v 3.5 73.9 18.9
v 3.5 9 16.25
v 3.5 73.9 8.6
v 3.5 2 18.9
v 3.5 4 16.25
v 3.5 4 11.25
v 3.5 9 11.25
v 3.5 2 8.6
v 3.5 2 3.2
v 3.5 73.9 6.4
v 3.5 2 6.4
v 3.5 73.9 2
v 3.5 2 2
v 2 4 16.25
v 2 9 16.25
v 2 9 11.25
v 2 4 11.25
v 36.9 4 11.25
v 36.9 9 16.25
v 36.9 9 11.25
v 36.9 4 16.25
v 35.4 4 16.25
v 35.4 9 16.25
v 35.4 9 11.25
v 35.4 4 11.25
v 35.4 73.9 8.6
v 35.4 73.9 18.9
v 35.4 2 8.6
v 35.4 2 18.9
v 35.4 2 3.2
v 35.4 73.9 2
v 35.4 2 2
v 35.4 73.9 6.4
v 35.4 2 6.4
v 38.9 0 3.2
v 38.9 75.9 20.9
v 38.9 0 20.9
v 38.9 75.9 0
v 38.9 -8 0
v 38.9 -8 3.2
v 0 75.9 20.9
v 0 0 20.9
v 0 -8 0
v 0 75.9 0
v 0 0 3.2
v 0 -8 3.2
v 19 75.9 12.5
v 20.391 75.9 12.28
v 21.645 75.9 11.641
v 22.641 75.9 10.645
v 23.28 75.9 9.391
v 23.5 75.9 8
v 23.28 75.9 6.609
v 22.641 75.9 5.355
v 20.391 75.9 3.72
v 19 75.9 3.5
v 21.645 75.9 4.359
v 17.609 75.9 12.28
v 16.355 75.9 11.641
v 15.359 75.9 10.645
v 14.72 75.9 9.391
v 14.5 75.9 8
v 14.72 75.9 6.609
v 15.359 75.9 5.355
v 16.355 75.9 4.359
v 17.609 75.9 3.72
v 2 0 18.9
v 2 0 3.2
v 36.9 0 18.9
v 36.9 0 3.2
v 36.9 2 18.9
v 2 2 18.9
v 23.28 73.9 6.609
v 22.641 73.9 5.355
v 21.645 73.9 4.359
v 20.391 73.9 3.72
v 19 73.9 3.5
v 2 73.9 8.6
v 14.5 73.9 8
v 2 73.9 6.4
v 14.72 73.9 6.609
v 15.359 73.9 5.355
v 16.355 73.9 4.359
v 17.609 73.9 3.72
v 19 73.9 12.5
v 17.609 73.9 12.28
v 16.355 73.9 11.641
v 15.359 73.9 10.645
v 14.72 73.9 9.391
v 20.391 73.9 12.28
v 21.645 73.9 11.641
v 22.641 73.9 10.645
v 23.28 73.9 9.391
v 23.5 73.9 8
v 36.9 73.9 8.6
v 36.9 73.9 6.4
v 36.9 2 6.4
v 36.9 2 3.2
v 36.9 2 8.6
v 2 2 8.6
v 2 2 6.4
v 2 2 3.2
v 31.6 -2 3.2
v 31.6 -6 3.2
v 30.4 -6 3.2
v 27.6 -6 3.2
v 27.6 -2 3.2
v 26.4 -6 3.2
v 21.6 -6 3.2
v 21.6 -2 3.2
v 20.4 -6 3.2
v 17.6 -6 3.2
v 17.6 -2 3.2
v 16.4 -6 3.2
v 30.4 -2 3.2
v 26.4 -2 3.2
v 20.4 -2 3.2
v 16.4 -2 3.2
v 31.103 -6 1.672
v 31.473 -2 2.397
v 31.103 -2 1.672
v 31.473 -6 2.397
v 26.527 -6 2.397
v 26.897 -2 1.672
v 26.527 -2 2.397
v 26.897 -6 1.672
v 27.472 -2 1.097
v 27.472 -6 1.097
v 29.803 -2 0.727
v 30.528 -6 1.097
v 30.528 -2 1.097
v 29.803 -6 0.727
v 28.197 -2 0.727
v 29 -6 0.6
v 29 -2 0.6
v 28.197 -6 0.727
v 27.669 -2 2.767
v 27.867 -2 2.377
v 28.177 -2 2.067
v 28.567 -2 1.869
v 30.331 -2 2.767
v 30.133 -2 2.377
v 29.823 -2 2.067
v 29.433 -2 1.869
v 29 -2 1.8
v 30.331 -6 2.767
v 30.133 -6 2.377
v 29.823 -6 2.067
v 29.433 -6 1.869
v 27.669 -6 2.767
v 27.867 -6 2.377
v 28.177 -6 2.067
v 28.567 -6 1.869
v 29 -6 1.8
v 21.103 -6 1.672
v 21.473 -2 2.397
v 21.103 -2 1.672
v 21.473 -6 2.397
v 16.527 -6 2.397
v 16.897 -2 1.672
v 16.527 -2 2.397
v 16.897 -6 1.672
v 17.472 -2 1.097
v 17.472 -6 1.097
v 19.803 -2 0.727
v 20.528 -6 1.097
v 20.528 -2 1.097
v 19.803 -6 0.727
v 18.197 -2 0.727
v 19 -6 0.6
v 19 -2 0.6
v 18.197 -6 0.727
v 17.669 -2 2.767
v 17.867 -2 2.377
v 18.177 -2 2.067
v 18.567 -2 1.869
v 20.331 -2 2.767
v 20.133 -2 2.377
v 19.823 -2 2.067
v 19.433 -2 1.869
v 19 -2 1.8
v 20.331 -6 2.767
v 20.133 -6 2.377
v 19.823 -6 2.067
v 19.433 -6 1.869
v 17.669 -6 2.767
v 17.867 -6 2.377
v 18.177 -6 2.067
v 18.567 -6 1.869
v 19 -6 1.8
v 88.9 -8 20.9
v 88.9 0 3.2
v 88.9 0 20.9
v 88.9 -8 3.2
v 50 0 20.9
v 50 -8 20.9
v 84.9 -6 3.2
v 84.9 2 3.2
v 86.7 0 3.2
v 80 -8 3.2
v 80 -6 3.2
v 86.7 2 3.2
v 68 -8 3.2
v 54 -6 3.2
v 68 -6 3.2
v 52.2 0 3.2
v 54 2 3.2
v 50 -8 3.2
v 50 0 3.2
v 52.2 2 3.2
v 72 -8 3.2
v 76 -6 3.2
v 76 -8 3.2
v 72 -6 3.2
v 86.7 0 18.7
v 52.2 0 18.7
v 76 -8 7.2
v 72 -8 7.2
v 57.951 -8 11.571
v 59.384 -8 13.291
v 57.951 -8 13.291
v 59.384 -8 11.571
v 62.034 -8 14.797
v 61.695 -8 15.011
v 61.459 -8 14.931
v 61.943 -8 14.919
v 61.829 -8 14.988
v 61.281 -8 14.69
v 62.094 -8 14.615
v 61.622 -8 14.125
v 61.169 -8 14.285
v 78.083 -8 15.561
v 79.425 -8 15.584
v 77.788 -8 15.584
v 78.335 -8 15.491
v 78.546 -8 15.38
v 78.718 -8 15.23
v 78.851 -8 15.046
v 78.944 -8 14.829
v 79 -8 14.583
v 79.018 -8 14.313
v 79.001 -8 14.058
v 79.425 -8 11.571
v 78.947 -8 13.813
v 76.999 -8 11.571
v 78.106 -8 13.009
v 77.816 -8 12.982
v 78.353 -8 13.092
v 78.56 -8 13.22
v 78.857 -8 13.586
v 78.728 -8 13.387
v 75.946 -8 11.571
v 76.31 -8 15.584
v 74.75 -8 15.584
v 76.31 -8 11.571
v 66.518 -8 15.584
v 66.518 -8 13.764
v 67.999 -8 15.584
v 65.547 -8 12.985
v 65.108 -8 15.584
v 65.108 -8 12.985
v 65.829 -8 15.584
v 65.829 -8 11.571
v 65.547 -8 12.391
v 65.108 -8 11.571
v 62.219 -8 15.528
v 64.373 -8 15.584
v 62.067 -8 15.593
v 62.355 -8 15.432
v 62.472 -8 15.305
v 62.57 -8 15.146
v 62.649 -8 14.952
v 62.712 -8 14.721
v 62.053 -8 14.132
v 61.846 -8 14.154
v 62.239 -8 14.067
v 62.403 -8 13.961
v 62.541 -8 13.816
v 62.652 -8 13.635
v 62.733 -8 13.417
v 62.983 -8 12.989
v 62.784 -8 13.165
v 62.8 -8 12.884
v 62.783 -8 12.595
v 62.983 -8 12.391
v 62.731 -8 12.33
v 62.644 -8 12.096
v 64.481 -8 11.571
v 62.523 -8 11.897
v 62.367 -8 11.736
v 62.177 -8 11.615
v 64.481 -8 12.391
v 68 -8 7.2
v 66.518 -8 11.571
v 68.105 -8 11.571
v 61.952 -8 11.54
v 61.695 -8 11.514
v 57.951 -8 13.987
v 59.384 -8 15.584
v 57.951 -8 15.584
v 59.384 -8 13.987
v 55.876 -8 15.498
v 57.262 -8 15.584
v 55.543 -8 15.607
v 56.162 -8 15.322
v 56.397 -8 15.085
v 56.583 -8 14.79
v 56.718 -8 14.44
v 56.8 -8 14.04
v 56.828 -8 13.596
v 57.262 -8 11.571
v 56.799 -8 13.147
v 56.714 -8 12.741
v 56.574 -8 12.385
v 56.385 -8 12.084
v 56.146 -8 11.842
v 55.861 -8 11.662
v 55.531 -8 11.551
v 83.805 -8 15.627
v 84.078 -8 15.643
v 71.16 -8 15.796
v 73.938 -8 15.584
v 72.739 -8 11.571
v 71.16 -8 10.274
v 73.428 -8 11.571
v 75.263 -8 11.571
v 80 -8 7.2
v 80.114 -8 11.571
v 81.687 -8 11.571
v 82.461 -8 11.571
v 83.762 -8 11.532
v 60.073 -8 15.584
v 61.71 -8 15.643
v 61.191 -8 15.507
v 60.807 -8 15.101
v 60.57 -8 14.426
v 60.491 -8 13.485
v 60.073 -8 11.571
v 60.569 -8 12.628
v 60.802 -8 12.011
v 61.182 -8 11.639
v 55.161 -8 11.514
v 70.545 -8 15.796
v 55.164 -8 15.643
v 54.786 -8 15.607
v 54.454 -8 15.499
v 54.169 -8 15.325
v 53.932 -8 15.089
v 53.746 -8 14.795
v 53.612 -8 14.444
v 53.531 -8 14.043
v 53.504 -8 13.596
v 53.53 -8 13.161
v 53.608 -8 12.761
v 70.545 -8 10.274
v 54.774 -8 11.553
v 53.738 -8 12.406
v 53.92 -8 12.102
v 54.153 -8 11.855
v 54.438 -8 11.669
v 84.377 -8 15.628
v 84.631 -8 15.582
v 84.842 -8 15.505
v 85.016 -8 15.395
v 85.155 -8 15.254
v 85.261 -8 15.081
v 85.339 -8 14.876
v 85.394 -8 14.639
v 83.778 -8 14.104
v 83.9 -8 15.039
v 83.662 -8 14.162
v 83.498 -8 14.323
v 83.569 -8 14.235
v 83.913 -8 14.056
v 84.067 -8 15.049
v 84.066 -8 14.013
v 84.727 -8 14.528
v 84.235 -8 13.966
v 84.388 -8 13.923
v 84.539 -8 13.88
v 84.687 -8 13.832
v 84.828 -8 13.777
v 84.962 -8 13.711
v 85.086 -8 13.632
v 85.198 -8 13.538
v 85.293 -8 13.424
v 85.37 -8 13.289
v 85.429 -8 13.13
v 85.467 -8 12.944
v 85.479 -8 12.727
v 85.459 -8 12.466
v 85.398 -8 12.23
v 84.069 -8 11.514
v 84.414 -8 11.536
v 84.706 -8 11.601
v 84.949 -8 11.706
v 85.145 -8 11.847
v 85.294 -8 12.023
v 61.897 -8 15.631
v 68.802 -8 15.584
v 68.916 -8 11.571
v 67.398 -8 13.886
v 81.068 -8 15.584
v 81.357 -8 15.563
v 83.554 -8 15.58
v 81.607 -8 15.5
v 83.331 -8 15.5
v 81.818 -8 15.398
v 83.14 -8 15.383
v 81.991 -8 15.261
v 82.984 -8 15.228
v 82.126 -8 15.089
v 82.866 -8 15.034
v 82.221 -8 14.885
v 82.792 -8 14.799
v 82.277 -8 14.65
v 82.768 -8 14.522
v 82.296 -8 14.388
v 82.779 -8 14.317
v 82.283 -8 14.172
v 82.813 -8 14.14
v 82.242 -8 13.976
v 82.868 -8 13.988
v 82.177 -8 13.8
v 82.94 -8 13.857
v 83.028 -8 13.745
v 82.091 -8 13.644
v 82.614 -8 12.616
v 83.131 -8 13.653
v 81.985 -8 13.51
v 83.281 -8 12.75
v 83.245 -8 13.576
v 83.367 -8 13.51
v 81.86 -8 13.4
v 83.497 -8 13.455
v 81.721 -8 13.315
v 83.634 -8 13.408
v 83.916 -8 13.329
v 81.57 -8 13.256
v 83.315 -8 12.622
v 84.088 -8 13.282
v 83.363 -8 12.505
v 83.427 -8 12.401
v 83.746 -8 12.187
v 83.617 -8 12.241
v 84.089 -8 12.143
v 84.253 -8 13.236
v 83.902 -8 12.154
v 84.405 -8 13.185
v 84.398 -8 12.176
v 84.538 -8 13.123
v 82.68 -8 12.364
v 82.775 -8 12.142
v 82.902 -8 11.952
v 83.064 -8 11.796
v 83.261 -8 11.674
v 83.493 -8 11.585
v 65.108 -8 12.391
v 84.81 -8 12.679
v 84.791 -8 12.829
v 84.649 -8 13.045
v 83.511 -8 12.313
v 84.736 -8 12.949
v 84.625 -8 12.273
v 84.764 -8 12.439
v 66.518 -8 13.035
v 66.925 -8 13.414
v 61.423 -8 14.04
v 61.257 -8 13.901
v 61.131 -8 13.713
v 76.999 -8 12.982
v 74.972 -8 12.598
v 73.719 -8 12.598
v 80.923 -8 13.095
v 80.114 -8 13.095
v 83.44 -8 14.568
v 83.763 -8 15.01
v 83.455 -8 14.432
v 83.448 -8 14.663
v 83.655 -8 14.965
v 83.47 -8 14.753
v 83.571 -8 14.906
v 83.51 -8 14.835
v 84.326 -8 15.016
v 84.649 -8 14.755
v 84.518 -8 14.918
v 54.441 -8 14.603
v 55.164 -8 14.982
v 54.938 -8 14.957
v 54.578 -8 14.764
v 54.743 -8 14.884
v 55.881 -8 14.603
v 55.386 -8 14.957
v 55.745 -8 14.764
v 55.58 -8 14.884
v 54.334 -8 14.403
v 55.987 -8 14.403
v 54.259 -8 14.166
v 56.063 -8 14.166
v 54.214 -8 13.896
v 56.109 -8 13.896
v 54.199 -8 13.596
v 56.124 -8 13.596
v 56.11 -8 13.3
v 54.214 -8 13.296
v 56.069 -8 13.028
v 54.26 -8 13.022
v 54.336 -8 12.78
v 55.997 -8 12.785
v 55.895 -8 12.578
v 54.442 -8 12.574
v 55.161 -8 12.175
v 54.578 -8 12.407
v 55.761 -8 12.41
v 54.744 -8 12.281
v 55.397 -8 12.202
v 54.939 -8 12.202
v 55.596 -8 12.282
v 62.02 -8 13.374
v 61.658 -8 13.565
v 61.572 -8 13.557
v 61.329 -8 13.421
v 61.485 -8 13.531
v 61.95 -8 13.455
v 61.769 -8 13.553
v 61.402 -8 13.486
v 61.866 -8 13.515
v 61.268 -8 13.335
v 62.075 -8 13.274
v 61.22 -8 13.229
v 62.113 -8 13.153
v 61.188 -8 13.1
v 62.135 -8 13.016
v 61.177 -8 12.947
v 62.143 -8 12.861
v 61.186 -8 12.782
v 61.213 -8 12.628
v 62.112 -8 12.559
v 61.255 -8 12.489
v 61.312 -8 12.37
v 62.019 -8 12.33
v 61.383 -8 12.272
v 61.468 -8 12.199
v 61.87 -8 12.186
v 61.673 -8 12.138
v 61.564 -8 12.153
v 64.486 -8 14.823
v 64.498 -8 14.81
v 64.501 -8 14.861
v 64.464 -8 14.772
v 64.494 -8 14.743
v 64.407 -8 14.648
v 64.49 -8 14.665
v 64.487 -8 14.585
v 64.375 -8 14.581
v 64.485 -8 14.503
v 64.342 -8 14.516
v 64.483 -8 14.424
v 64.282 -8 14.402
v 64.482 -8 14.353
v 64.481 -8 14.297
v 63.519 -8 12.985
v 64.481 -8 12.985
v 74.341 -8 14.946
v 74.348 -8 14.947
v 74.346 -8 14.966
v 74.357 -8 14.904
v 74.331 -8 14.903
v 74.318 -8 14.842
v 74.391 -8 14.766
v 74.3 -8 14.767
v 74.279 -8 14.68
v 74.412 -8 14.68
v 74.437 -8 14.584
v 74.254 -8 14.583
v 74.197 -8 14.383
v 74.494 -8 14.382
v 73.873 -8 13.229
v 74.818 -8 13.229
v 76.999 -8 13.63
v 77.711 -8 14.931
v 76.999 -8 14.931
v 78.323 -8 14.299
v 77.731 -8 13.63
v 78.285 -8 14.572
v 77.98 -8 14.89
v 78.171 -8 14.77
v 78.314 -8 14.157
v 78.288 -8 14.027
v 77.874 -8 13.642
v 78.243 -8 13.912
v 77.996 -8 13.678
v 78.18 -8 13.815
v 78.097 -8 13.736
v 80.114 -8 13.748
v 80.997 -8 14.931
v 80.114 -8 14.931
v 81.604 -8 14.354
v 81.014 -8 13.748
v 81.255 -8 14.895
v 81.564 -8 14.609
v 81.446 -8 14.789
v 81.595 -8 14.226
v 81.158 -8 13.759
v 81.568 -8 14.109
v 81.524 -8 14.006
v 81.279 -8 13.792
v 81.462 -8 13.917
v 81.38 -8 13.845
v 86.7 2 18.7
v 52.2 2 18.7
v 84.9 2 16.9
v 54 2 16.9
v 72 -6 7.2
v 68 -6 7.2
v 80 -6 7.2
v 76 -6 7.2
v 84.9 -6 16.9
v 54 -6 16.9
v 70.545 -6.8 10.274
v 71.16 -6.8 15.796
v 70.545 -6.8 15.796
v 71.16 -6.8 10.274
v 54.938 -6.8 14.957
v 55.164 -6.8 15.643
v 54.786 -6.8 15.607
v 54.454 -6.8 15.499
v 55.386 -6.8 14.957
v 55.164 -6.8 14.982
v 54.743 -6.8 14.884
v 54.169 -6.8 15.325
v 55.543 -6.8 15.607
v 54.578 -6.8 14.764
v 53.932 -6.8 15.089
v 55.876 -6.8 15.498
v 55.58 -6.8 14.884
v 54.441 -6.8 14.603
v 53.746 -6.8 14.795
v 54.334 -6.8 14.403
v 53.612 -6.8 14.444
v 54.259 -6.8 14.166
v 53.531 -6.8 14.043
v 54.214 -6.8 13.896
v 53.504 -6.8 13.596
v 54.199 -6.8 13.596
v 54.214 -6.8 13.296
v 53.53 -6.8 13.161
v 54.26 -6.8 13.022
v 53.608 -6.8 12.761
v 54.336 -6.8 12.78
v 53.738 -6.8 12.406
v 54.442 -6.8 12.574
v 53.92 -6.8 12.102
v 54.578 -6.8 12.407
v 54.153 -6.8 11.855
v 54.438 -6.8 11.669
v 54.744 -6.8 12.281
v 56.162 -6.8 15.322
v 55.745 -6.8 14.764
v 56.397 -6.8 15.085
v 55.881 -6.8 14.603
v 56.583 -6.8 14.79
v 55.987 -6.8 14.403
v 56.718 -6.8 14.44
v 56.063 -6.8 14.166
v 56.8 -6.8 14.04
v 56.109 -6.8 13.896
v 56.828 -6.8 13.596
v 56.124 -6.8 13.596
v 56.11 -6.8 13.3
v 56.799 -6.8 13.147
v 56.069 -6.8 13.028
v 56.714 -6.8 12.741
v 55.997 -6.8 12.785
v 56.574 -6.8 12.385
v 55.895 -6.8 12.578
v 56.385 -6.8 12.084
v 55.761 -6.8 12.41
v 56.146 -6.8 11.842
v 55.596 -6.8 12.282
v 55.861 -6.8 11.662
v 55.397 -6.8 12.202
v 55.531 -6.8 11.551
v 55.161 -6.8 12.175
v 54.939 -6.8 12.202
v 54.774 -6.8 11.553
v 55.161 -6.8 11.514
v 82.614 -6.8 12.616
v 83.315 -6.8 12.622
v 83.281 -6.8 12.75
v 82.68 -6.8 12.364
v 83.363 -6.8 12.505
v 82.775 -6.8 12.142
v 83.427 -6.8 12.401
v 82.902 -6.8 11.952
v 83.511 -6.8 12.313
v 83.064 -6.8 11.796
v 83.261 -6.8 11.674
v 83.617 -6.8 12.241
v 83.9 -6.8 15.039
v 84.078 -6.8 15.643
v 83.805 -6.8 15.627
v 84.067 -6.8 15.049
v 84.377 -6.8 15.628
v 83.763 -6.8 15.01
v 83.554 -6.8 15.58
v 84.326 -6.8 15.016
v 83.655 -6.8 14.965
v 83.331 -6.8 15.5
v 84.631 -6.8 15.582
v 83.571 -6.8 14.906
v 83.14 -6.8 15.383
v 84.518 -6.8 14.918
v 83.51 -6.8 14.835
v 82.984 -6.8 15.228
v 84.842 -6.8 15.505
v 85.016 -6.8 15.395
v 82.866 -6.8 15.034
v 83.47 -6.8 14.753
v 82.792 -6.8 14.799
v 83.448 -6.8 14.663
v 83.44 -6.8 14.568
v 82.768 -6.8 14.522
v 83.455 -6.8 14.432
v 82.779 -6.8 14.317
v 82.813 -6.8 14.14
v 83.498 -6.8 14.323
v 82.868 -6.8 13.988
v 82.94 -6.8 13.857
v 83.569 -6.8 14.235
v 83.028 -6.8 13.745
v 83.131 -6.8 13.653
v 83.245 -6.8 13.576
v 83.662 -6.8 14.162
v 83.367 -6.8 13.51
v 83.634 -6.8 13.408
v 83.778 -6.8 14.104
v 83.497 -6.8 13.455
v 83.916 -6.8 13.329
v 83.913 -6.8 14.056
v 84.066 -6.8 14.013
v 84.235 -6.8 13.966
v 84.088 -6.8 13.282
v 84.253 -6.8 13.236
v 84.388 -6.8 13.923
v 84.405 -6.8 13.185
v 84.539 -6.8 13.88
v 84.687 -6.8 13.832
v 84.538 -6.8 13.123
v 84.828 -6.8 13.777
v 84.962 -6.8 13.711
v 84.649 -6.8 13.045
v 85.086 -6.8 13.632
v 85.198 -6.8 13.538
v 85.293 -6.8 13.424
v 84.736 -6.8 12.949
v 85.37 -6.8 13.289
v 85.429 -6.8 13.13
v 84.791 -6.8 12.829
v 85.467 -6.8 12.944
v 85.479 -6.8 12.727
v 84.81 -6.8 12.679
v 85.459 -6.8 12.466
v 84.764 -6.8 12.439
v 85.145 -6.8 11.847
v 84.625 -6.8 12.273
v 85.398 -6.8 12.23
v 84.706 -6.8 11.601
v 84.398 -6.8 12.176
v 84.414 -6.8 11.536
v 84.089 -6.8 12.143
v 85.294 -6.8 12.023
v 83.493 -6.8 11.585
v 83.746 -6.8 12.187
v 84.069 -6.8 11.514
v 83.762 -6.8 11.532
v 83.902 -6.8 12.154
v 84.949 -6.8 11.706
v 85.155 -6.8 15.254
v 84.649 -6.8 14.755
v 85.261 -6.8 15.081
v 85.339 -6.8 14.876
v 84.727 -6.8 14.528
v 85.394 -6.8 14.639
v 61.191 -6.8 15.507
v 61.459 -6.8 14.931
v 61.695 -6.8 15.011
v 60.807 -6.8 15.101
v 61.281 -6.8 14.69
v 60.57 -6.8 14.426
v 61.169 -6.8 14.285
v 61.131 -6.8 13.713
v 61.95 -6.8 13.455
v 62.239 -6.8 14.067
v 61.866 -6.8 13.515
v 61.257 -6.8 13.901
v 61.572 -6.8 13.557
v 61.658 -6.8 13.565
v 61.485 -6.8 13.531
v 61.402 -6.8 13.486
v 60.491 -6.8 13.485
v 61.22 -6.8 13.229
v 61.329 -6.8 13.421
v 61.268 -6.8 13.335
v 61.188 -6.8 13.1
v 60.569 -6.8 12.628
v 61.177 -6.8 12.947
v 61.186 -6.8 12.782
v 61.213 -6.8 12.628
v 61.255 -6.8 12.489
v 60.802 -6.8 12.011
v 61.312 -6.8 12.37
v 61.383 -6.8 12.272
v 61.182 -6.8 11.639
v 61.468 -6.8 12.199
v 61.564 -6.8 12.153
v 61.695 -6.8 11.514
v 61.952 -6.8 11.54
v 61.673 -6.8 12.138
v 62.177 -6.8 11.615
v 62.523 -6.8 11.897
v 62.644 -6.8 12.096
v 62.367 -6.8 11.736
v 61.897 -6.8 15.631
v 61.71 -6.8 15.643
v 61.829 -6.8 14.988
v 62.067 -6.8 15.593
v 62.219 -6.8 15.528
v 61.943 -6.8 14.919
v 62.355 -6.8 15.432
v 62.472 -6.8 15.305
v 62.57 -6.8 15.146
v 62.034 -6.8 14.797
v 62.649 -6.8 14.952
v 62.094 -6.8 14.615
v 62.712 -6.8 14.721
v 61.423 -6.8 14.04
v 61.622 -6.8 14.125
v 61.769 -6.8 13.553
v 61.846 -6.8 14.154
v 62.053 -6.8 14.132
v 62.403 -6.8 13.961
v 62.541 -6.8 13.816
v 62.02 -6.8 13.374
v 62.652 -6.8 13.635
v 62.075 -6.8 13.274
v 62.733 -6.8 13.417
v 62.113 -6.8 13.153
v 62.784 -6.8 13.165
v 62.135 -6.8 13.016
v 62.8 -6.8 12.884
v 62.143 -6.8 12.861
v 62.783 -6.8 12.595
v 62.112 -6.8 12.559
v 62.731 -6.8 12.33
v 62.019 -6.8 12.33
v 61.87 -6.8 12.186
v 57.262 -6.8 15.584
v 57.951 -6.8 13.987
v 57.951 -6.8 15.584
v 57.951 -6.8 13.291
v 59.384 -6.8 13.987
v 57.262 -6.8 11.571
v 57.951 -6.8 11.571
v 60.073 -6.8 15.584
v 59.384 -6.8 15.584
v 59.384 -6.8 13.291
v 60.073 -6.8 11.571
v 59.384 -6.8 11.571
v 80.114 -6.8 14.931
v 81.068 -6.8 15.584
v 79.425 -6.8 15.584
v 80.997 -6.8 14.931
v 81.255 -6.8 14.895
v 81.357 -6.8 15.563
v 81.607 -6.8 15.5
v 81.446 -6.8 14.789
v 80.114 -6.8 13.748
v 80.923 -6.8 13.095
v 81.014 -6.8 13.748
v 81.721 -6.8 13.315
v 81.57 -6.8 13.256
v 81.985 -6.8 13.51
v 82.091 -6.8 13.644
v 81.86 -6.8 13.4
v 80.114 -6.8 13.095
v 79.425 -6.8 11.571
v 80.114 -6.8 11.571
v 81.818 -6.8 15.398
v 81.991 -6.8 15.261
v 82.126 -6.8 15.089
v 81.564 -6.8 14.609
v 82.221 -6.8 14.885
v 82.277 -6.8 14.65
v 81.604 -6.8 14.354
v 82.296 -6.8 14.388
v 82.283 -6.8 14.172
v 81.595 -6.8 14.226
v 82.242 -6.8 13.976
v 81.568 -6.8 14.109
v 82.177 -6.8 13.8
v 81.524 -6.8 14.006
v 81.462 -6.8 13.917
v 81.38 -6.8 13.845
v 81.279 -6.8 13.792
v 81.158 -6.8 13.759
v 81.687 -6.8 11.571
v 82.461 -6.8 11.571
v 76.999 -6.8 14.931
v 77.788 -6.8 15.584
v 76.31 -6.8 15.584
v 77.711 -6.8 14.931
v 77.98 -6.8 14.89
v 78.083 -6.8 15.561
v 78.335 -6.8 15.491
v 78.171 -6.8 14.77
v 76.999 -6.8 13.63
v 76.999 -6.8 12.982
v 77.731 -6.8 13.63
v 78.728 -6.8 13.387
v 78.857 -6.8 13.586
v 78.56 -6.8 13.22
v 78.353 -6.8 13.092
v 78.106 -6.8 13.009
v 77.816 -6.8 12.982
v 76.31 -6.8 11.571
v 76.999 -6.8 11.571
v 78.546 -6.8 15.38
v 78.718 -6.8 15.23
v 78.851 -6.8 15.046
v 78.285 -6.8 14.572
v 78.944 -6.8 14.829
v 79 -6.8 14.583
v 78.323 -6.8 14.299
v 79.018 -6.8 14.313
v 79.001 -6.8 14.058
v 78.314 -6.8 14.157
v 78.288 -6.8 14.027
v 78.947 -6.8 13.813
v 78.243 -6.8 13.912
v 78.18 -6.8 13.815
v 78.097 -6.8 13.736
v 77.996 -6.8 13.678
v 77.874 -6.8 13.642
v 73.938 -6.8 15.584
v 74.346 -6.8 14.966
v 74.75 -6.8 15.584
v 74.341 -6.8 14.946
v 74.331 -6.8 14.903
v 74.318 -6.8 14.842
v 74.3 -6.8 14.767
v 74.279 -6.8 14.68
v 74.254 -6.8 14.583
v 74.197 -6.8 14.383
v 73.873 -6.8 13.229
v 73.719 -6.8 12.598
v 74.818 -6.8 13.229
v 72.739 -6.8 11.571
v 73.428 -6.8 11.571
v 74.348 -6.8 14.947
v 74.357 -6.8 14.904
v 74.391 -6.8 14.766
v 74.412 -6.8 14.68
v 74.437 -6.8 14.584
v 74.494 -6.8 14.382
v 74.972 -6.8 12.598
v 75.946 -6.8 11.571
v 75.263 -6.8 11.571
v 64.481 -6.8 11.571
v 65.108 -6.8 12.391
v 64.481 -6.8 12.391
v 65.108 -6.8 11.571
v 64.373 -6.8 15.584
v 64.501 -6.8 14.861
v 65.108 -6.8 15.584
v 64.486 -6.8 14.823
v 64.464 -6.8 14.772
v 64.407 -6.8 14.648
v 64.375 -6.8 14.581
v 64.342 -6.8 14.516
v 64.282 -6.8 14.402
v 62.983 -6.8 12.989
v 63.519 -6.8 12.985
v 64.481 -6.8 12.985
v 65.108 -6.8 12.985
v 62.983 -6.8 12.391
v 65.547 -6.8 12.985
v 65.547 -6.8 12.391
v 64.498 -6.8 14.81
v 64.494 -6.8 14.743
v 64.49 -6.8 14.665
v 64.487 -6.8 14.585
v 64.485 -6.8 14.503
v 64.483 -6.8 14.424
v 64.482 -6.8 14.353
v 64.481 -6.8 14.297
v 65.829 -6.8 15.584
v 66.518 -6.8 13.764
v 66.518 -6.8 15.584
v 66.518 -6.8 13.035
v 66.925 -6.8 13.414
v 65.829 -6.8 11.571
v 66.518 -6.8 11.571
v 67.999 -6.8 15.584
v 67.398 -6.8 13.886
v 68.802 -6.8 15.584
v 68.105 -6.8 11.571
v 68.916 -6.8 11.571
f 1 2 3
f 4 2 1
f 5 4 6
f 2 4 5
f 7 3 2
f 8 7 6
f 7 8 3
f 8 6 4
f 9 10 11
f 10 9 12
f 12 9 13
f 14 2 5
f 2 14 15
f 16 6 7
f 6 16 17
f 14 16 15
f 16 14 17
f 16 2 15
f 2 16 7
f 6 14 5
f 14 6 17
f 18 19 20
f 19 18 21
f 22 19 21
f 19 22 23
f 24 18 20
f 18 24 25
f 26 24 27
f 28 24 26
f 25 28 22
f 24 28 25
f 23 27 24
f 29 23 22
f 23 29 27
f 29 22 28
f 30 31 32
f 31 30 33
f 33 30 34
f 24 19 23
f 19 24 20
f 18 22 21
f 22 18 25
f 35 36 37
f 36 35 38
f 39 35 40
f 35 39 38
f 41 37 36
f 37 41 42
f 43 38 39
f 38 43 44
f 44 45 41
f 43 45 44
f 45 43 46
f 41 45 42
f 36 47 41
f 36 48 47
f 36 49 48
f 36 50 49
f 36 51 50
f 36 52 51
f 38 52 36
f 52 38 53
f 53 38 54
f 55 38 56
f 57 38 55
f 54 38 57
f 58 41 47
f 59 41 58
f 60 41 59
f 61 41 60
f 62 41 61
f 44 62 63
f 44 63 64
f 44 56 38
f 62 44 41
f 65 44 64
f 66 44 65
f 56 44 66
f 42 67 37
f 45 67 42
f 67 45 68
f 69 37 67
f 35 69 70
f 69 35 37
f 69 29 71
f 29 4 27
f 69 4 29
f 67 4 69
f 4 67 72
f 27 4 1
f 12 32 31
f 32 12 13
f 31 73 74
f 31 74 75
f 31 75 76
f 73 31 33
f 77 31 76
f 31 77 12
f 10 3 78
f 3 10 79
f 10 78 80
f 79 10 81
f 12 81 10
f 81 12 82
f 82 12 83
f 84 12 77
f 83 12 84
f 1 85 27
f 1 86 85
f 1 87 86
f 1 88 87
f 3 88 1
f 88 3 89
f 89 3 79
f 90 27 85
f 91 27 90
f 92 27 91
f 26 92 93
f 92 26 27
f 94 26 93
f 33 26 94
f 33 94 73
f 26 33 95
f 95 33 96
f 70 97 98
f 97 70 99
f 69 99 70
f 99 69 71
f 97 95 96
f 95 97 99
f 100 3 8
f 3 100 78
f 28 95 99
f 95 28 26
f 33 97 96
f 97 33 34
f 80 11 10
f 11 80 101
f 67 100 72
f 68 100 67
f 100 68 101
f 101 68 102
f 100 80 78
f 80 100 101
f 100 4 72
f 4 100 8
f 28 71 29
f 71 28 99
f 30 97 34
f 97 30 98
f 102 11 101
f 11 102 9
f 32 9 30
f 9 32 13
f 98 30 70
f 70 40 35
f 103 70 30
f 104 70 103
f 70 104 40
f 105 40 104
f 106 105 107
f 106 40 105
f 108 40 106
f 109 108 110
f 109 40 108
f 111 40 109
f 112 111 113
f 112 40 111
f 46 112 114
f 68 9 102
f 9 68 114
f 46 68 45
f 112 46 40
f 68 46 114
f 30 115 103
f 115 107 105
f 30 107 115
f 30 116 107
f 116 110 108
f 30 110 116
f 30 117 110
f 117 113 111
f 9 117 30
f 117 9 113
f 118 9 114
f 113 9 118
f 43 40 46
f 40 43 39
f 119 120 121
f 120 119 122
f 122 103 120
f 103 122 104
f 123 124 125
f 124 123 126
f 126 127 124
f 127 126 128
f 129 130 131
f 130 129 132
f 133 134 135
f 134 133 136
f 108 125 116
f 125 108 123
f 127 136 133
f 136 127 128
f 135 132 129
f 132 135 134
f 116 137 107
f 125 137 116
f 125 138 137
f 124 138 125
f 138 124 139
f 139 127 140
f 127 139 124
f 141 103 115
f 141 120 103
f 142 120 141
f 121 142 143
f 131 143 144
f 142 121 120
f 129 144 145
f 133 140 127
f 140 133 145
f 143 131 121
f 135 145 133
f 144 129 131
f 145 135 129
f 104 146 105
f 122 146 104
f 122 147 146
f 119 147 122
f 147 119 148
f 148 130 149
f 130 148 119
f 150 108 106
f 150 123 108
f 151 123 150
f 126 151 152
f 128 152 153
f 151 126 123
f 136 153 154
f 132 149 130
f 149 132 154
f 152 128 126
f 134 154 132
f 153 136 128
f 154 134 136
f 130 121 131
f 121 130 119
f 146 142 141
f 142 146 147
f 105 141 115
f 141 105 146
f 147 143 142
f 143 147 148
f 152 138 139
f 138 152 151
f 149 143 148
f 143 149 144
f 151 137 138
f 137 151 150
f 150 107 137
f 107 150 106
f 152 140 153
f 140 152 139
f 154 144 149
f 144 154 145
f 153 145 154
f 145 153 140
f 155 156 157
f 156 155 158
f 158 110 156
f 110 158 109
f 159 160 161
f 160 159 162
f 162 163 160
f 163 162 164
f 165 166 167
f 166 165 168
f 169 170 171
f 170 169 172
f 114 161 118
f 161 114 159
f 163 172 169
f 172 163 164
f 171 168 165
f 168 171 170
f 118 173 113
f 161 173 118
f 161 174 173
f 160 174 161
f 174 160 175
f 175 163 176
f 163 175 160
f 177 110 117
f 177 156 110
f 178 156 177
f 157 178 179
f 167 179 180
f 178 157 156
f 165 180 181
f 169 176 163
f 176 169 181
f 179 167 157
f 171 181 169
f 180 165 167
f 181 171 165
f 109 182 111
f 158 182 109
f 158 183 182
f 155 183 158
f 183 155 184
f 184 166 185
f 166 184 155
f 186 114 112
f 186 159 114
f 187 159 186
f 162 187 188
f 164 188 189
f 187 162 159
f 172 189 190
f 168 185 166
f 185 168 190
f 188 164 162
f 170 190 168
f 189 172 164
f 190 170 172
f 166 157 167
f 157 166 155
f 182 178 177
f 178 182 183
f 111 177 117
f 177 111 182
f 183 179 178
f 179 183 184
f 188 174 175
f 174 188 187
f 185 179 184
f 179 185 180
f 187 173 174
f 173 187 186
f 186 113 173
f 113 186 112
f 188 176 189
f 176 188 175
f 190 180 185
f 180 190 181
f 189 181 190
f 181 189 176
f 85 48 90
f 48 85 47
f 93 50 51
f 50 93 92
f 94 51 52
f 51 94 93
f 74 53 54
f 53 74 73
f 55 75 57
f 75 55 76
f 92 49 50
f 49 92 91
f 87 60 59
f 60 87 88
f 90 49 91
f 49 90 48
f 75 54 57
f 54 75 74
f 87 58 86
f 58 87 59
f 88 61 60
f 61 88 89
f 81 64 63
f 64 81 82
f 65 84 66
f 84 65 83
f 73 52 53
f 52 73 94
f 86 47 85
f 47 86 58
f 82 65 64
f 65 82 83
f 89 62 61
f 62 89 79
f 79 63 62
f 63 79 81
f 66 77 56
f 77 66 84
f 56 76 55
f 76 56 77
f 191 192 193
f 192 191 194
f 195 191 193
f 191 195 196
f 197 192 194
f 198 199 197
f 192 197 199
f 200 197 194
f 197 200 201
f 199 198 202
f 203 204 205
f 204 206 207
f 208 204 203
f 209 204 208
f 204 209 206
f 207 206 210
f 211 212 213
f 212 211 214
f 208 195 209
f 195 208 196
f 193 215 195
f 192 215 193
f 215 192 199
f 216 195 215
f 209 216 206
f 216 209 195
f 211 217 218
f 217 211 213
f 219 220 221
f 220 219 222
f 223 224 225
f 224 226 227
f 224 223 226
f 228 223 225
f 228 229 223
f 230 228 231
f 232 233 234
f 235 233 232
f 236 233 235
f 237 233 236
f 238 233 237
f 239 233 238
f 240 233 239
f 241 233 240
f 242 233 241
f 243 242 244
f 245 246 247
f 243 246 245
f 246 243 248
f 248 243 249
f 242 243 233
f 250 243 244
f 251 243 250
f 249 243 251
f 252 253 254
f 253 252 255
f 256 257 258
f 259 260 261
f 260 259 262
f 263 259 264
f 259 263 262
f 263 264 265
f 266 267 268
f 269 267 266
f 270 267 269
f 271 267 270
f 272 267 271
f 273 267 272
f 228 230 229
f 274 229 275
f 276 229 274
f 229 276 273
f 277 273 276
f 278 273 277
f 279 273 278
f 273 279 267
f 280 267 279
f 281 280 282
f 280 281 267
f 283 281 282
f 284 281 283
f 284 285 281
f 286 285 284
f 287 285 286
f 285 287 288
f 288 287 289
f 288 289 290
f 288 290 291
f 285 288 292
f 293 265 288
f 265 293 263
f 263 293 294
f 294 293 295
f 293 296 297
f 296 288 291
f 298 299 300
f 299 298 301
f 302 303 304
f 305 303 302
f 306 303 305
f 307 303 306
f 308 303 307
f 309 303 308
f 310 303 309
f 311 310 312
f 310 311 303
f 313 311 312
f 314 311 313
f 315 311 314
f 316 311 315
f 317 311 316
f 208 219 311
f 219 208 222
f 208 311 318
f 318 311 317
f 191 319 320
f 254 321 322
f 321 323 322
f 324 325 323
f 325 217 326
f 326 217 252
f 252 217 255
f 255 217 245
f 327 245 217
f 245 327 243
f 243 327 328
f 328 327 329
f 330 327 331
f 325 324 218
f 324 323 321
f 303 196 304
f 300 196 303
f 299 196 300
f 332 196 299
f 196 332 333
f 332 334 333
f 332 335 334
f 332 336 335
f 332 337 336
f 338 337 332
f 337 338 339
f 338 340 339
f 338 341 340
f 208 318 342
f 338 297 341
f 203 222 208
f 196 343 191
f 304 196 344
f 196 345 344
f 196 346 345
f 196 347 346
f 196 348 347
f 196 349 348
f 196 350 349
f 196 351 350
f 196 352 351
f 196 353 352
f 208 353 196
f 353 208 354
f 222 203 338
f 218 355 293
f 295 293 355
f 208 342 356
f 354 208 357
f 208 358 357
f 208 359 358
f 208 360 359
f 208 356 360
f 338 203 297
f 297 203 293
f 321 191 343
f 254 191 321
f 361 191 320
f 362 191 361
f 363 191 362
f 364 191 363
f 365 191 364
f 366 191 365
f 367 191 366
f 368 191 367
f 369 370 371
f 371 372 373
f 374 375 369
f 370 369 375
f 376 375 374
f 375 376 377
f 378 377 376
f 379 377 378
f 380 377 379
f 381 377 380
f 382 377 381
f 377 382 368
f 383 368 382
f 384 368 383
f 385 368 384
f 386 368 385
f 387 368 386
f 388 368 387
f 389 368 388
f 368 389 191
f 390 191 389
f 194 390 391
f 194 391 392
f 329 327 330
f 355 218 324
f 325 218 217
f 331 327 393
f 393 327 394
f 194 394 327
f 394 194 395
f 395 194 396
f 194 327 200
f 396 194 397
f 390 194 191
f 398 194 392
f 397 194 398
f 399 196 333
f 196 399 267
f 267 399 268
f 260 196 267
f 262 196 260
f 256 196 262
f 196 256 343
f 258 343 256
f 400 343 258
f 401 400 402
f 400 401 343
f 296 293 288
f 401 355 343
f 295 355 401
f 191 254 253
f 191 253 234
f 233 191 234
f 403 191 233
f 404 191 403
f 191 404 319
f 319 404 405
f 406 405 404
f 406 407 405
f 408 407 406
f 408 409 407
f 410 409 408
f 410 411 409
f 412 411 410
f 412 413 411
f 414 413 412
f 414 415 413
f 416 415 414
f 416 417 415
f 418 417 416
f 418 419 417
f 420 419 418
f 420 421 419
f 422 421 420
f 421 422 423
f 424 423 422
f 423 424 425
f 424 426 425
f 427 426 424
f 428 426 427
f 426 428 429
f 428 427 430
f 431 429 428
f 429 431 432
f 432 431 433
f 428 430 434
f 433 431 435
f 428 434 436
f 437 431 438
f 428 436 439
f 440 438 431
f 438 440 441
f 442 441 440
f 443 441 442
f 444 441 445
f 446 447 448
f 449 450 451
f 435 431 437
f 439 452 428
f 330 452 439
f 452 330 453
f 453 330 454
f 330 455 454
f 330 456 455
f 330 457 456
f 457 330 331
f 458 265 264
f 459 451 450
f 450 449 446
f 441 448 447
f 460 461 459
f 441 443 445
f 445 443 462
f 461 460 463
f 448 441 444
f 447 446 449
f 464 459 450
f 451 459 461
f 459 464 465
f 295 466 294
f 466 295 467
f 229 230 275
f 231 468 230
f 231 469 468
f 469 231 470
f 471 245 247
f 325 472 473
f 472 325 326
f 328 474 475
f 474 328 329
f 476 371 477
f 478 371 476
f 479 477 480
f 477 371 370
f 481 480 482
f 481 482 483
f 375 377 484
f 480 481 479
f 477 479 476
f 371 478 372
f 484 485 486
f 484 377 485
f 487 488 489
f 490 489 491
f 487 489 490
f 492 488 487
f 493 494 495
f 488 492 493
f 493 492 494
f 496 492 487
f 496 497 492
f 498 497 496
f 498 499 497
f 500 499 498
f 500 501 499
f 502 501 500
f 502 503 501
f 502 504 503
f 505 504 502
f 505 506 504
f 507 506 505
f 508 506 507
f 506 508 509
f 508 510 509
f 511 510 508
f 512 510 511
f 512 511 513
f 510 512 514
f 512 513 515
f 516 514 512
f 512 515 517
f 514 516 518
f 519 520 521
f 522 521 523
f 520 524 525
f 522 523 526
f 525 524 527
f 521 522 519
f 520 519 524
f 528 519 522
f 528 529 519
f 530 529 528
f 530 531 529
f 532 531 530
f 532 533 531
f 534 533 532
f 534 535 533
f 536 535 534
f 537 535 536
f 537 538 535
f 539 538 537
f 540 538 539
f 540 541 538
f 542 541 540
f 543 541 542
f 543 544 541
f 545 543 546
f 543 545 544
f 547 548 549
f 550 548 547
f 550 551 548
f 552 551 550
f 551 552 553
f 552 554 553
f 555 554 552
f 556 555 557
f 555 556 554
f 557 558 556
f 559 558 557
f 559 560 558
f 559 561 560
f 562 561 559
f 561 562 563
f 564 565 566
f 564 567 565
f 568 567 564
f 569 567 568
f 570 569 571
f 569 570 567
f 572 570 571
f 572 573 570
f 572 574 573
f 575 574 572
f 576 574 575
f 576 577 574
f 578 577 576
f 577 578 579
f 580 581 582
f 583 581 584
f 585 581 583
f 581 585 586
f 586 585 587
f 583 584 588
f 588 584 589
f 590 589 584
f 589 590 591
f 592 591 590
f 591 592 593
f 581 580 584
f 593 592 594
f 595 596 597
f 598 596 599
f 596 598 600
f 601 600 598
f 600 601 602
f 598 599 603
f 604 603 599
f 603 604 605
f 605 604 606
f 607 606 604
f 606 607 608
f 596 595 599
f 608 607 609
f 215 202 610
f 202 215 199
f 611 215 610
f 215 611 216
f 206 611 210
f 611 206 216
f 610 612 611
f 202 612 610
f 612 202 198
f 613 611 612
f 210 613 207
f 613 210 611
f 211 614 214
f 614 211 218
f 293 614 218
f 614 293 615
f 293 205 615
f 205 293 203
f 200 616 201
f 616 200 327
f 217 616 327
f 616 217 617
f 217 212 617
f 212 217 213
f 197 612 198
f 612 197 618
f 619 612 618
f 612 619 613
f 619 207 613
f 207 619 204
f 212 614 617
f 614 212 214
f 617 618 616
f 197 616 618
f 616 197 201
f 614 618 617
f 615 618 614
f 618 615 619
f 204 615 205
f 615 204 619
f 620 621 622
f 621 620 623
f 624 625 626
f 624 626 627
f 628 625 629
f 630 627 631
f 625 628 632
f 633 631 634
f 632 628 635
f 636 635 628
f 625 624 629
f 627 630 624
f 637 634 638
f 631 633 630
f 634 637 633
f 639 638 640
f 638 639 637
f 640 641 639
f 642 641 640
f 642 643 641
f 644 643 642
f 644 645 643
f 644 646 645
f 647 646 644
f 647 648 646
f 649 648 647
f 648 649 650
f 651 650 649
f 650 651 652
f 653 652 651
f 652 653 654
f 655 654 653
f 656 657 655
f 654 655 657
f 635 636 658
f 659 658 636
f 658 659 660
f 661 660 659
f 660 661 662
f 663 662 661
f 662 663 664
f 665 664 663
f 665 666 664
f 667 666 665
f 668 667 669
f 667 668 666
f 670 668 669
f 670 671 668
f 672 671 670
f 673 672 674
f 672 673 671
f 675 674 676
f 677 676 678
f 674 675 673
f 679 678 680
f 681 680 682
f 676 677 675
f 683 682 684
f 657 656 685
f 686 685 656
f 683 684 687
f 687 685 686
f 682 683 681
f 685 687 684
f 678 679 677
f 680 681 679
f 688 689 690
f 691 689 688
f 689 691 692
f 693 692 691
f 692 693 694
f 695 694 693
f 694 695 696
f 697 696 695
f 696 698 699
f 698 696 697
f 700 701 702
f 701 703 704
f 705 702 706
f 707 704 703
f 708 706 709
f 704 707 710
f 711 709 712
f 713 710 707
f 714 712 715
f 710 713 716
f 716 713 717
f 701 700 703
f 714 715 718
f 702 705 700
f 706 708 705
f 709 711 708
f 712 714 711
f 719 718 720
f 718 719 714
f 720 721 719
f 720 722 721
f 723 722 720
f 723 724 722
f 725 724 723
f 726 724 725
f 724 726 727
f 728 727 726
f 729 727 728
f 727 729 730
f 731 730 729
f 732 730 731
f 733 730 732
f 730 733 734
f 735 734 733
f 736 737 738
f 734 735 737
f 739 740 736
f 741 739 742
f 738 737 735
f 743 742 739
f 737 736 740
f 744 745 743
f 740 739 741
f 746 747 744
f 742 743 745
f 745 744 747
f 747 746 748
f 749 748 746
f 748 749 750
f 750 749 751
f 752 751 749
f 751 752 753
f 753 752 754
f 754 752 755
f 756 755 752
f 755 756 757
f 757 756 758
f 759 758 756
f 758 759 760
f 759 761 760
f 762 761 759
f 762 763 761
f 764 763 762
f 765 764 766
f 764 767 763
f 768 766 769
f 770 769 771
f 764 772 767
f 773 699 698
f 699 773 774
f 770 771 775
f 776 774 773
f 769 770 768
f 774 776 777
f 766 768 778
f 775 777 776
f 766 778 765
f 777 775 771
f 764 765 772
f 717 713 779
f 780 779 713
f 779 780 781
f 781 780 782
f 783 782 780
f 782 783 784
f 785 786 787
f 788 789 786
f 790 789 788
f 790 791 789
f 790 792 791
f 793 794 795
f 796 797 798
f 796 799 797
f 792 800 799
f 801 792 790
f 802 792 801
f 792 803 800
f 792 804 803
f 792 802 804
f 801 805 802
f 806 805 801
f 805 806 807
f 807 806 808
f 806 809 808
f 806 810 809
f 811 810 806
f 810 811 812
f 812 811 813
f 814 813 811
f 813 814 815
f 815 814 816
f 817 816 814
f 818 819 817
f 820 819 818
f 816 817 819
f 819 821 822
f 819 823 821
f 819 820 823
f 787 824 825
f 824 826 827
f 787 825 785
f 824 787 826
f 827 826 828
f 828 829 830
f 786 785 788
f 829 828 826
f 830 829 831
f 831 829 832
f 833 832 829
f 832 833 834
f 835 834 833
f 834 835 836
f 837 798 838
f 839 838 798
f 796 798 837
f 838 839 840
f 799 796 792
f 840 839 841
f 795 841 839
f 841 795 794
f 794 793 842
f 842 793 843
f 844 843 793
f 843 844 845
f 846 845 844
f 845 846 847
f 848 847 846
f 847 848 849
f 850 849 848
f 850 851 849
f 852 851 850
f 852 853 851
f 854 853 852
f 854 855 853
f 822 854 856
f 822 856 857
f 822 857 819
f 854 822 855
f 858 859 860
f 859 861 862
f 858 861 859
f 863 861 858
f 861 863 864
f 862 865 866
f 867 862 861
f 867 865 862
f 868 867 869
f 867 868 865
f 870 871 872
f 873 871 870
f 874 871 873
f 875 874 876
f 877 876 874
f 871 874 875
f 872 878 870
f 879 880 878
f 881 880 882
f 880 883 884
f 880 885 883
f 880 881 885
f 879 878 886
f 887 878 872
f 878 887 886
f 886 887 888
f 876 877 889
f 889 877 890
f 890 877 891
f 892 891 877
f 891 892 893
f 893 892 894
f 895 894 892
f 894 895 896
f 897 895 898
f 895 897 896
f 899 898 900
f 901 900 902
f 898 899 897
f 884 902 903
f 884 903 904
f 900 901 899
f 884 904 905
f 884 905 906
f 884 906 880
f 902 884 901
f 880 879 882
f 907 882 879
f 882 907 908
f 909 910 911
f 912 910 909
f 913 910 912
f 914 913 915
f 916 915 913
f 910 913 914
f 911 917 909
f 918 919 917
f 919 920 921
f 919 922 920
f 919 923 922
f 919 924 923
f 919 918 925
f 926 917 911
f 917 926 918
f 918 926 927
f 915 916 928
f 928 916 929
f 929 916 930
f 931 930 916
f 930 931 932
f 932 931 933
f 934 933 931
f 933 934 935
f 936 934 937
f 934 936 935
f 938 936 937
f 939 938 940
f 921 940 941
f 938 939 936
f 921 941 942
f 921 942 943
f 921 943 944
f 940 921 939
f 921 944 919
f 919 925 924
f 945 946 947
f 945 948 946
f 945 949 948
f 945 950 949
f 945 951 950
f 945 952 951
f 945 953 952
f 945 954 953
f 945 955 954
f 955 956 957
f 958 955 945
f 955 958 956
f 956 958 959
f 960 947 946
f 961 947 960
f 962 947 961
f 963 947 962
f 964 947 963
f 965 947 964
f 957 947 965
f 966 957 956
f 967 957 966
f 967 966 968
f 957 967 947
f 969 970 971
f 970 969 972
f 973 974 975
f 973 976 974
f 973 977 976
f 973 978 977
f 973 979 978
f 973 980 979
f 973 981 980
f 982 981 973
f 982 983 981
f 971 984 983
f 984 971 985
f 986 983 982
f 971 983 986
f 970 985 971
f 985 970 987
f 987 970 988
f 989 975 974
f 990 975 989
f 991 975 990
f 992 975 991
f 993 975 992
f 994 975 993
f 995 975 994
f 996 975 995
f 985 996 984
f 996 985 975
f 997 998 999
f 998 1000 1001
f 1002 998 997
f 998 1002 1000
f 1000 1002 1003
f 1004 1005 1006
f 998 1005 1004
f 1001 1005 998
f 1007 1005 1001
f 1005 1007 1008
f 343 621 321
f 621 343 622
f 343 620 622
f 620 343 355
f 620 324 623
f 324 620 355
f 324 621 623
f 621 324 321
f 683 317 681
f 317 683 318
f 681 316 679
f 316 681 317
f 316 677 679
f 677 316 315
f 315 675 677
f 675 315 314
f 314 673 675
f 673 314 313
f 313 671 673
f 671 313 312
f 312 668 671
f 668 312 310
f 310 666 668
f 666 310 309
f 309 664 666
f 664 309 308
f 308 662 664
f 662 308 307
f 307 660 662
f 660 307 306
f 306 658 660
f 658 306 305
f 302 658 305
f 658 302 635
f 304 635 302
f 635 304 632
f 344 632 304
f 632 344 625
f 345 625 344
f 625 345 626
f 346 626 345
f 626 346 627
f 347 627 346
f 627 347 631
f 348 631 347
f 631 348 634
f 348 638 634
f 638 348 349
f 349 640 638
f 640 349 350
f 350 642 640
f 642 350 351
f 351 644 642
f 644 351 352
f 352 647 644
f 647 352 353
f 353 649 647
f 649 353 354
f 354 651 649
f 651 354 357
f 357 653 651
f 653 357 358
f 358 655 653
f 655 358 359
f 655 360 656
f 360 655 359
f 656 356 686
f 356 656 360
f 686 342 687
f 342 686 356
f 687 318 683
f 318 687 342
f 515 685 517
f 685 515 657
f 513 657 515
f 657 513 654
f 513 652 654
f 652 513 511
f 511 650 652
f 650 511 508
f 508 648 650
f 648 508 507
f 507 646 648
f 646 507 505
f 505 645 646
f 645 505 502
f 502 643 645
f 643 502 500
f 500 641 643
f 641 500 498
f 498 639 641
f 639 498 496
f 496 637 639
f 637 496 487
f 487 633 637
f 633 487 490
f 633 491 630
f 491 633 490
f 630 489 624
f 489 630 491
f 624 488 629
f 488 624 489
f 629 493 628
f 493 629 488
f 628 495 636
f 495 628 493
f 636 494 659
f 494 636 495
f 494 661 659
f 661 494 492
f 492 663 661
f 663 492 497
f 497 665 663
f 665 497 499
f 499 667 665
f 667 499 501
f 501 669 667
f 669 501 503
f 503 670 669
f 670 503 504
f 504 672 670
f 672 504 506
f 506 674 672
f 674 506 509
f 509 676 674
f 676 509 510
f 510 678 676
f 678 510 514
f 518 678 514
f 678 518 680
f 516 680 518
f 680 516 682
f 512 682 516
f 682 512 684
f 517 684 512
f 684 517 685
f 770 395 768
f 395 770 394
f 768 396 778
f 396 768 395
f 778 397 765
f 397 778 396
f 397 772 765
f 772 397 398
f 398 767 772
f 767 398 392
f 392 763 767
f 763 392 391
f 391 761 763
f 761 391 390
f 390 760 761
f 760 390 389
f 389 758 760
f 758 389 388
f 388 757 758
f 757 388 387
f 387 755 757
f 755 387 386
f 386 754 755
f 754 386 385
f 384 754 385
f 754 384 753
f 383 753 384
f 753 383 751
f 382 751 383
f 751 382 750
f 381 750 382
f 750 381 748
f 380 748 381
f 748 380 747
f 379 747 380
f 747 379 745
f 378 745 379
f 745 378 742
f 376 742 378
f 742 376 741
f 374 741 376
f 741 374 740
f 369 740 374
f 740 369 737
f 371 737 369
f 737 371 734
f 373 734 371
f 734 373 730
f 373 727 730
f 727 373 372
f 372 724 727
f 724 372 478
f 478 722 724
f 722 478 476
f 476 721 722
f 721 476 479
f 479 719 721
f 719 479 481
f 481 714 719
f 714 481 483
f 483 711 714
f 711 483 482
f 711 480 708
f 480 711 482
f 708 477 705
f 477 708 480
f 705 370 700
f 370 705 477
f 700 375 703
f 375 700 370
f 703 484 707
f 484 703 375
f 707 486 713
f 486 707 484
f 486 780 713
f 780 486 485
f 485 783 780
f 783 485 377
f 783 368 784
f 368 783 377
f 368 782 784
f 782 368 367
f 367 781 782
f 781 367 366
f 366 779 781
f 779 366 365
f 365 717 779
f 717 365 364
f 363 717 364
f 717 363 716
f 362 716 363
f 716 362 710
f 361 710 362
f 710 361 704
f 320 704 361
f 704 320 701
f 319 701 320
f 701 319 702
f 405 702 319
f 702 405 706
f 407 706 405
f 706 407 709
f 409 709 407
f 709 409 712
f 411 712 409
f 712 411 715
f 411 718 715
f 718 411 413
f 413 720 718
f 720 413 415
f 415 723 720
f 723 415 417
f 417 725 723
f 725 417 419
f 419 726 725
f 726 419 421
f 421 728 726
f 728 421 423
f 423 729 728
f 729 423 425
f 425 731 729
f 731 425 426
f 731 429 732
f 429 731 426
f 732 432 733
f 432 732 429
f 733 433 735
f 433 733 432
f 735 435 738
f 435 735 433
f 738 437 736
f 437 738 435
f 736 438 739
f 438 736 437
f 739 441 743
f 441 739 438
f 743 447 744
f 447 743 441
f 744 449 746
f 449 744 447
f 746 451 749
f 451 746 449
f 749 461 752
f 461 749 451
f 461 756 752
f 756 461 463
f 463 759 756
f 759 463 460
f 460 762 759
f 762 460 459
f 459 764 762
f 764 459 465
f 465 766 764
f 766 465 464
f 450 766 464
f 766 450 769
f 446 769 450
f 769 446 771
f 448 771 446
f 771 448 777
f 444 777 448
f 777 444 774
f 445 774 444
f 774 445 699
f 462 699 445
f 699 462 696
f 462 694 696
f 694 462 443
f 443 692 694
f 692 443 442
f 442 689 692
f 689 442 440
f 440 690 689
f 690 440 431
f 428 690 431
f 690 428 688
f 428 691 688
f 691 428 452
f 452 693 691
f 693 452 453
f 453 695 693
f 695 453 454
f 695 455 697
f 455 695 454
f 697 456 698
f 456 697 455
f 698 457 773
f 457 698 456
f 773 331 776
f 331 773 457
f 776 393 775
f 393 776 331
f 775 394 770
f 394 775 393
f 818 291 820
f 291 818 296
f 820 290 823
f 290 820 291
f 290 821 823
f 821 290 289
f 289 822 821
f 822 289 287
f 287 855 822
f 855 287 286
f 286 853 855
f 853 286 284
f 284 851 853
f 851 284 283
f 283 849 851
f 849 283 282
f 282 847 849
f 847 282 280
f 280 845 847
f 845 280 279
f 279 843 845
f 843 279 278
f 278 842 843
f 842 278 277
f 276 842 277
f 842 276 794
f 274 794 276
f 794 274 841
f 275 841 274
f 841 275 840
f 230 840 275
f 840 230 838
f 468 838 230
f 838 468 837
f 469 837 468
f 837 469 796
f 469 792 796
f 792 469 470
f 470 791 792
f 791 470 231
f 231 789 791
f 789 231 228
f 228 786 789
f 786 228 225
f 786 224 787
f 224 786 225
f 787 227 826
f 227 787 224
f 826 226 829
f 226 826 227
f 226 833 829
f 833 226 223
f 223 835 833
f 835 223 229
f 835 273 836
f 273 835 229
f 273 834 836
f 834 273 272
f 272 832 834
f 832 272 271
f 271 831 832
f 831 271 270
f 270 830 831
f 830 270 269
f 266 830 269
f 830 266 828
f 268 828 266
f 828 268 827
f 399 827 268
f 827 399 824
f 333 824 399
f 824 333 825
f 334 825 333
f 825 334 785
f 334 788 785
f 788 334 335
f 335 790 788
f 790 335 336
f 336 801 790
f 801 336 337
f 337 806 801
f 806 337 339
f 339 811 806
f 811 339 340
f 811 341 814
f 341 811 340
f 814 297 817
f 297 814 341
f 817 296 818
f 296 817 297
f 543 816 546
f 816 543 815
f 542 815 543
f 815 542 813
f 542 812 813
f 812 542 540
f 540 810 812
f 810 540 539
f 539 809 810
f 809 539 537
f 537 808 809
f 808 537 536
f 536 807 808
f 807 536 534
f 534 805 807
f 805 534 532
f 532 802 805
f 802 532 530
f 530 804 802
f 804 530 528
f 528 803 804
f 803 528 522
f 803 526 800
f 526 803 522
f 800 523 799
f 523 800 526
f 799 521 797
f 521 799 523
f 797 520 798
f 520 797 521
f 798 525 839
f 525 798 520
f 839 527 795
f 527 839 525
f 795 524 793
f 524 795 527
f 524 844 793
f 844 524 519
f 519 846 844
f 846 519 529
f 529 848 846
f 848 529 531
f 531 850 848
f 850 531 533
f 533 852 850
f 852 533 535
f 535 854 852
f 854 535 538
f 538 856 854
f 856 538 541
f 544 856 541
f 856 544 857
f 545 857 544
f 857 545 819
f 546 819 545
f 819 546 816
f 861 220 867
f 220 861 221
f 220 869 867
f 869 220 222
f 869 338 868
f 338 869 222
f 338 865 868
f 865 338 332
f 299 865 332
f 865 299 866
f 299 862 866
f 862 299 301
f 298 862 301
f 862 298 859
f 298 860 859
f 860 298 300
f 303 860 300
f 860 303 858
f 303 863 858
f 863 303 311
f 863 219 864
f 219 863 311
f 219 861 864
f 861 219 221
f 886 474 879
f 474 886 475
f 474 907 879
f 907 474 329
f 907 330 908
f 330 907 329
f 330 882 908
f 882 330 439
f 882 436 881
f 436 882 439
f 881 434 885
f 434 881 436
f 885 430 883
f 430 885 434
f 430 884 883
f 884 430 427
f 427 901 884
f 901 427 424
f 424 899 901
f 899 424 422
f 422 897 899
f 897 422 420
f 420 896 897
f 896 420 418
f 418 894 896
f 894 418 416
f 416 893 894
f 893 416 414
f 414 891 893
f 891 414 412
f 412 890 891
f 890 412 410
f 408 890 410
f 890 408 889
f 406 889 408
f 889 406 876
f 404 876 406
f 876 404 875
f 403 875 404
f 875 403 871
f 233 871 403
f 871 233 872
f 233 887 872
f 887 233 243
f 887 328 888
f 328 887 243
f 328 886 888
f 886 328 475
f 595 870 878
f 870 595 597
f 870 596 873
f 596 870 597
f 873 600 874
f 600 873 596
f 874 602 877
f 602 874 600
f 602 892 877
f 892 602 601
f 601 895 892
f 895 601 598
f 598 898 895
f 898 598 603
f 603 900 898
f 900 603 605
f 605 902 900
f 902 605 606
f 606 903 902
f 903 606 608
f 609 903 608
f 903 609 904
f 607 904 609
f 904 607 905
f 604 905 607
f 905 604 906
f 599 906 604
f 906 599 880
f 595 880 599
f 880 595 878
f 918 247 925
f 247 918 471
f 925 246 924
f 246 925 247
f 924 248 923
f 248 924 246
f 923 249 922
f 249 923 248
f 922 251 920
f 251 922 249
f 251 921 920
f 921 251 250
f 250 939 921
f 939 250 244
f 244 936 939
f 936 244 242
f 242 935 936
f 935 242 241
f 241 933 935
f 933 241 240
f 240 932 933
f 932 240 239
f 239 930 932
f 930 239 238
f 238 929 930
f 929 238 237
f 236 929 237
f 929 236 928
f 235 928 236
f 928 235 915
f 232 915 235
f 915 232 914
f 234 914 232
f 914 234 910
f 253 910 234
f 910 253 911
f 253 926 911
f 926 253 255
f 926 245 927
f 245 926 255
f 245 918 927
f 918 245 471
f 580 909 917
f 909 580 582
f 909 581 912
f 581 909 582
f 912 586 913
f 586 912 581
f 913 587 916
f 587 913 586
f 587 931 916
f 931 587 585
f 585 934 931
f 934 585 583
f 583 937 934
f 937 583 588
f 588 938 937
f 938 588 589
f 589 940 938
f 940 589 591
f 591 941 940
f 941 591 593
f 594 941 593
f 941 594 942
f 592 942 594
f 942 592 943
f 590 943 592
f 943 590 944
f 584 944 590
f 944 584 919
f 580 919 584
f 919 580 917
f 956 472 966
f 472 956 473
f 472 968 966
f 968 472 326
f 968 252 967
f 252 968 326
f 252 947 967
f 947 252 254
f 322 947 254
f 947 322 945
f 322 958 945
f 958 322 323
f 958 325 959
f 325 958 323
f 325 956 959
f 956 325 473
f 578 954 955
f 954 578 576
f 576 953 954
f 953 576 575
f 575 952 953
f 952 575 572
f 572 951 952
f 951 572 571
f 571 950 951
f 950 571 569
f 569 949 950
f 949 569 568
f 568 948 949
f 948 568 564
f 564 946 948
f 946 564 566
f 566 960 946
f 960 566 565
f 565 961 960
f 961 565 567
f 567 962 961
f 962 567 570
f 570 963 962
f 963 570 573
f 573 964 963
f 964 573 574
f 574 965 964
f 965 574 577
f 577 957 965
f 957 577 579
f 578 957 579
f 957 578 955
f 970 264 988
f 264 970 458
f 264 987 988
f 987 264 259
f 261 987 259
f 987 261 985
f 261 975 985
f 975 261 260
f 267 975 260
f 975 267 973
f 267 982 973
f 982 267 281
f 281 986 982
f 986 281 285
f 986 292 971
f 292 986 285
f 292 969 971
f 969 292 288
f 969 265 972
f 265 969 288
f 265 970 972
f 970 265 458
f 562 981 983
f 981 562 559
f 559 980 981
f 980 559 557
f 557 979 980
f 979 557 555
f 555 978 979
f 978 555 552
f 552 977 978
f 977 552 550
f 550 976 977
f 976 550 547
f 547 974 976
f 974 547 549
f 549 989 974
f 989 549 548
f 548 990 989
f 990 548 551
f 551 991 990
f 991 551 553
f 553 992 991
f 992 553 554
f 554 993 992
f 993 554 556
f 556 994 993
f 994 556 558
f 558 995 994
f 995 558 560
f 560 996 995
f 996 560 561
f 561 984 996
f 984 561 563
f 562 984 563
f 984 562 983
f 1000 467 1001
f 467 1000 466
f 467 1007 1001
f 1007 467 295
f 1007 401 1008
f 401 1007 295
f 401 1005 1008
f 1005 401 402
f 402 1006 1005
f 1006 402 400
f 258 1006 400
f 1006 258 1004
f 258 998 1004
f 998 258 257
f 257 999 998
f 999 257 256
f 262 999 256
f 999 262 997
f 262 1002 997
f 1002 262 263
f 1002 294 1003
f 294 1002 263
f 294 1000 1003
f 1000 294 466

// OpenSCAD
module pcb_box(w, h, pcb_thickness, above, below, rail=3, wall=2, dent_size = 5) {
    inside_h = above+below+pcb_thickness;
    difference () {
        // Outer wall
        cube([w+2*wall, h+2*wall, inside_h+2*wall]);
        // Inner wall
        translate([wall+rail,0,wall]) {
            cube([w-2*rail, h+wall, inside_h]);
        }
        // Rail
        translate([wall,wall,wall+below]) {
            cube([w,h, pcb_thickness]);
        }
        // Front opening
        translate([wall,0,wall]) {
            cube([w,wall,inside_h]);
        }
        
        // Cover dent
        for (x = [wall, wall+w-rail]) {
            translate([x,2*wall, wall+below+pcb_thickness+above/2-dent_size/2]) {
                cube([rail,dent_size,dent_size]);
            }
        }
    }
}

module cable_tie_cup(spacing, width = 1, height = 4, depth = 0.5) {
    $fn = 20;
    translate([0,depth,0]) {
        // Round part
        difference () {
            difference () {
                cylinder(height, spacing/2+width/2, spacing/2+width/2, center = true);
                cylinder(height, spacing/2-width/2, spacing/2-width/2, center = true);
            }
            safe = spacing+width;
            translate([-safe,-safe,-height]) {
                cube([2*safe,safe,2*height]);
            }
        }

        // Straigth part
        difference () {
            translate([-spacing/2-width/2,-depth,-height/2]) {
                cube([spacing+width,depth,height]);
            }
            translate([-spacing/2+width/2,-depth,-height]) {
                cube([spacing-width,depth,2*height]);
            }
        }
    }
}

margin = 0.4;
pcb = 1.6;
pcb_real = 2.2;
h = 71.5+margin;
pcb_surface = 6;
pull = 10;

thick = 2+1.2; // Thickness of front panel
holes = [[29, 4], [19, 4]];

difference () {

    union () {
        // PCB box
        pcb_box(34.5+margin, h, pcb_real, 11.5-pcb+margin, pcb_surface-pcb, rail=1.5);
        
        translate([0,-pull+2,0]) {
            cube([34.5+margin+2*2,pull,thick]);
        }
    }
    
        // SMA hole
        hole_w = 9;
        translate([2+17,h+3,2+pcb_surface]) {
            rotate([90,0,0]) {
                cylinder(2,hole_w/2, hole_w/2, center=true, $fn=20);
            }
        }

    // Holes for cable ties
    for (hole = holes) {
        translate([hole[0],-4,thick]) {
            rotate([-90,0,0]) {
                cable_tie_cup(hole[1], 1.2, 4, 0);
            }
        }
    }
}

// Calculated from magic values
inner_height = pcb_real+ 11.5-pcb+margin+pcb_surface-pcb-thick+2;
pcb_width = 34.5+margin;

translate([50,0,0]) {
    difference () {
        union () {
            // Outer box
            translate([0,-pull+2,thick]) {
                cube([pcb_width+2*2,pull-2,inner_height+2]);
            }

            // Indent
            translate([0+2+margin/2,0,thick]) {
                cube([pcb_width-margin,2,inner_height-margin/2]);
            }
        }
        // Empty space
        translate([0+2+2,-pull+2*2,thick]) {
            cube([pcb_width-2*2,10,inner_height-2]);
        }
        // Cable inputs
        for (hole = [20,28]) { // Old holes
            translate([hole,-pull+2,thick+4/2]) {
                cube([4,10,4], center=true);
            }
        }
        
        // Text
        translate([(pcb_width+4)/2,-pull+2+1.2,13]) {
            rotate([90,0,00]) {
                linear_extrude(2) {
                    text("OH64K | APRS", font="Liberation Sans Narrow:style:Bold", size=4.2, halign="center", valign="center");
            }
        }
    }

    }
}
